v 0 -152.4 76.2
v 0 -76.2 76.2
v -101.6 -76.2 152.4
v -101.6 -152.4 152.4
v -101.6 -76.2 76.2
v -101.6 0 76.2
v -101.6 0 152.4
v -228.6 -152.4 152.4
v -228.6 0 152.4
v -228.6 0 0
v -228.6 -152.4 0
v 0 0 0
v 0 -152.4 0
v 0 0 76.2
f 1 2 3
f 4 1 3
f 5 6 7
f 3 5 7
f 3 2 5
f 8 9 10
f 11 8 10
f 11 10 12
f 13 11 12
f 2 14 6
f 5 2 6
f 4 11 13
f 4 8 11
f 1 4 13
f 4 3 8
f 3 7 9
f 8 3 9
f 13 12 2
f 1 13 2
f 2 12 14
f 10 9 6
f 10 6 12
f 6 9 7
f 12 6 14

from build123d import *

# Parameters (mm, degrees)
F1_DEPTH = 152.4
F3_DEPTH = 76.2


with BuildPart() as f1:
    # F0 (on Front) → F1 (new body)
    with BuildSketch(Plane.XZ):
        Polygon((-228.6, 0), (0, 0), (0, 76.2), (-100.878969, 76.2), (-101.6, 152.4), (-228.6, 152.4), align=None)
        Polygon((-100.878969, 76.2), (0, 76.2), (-101.6, 152.4), align=None)
    extrude(amount=F1_DEPTH)

    # F2 (on face) → F3 (cut)
    with BuildSketch(Plane(origin=(0, 0, 0), x_dir=(-1, 0, 0), z_dir=(0, 1, 0))):
        Polygon((101.6, 152.4), (0, 76.2), (101.6, 76.2), align=None)
    extrude(amount=-F3_DEPTH, mode=Mode.SUBTRACT)


solid = f1.part
